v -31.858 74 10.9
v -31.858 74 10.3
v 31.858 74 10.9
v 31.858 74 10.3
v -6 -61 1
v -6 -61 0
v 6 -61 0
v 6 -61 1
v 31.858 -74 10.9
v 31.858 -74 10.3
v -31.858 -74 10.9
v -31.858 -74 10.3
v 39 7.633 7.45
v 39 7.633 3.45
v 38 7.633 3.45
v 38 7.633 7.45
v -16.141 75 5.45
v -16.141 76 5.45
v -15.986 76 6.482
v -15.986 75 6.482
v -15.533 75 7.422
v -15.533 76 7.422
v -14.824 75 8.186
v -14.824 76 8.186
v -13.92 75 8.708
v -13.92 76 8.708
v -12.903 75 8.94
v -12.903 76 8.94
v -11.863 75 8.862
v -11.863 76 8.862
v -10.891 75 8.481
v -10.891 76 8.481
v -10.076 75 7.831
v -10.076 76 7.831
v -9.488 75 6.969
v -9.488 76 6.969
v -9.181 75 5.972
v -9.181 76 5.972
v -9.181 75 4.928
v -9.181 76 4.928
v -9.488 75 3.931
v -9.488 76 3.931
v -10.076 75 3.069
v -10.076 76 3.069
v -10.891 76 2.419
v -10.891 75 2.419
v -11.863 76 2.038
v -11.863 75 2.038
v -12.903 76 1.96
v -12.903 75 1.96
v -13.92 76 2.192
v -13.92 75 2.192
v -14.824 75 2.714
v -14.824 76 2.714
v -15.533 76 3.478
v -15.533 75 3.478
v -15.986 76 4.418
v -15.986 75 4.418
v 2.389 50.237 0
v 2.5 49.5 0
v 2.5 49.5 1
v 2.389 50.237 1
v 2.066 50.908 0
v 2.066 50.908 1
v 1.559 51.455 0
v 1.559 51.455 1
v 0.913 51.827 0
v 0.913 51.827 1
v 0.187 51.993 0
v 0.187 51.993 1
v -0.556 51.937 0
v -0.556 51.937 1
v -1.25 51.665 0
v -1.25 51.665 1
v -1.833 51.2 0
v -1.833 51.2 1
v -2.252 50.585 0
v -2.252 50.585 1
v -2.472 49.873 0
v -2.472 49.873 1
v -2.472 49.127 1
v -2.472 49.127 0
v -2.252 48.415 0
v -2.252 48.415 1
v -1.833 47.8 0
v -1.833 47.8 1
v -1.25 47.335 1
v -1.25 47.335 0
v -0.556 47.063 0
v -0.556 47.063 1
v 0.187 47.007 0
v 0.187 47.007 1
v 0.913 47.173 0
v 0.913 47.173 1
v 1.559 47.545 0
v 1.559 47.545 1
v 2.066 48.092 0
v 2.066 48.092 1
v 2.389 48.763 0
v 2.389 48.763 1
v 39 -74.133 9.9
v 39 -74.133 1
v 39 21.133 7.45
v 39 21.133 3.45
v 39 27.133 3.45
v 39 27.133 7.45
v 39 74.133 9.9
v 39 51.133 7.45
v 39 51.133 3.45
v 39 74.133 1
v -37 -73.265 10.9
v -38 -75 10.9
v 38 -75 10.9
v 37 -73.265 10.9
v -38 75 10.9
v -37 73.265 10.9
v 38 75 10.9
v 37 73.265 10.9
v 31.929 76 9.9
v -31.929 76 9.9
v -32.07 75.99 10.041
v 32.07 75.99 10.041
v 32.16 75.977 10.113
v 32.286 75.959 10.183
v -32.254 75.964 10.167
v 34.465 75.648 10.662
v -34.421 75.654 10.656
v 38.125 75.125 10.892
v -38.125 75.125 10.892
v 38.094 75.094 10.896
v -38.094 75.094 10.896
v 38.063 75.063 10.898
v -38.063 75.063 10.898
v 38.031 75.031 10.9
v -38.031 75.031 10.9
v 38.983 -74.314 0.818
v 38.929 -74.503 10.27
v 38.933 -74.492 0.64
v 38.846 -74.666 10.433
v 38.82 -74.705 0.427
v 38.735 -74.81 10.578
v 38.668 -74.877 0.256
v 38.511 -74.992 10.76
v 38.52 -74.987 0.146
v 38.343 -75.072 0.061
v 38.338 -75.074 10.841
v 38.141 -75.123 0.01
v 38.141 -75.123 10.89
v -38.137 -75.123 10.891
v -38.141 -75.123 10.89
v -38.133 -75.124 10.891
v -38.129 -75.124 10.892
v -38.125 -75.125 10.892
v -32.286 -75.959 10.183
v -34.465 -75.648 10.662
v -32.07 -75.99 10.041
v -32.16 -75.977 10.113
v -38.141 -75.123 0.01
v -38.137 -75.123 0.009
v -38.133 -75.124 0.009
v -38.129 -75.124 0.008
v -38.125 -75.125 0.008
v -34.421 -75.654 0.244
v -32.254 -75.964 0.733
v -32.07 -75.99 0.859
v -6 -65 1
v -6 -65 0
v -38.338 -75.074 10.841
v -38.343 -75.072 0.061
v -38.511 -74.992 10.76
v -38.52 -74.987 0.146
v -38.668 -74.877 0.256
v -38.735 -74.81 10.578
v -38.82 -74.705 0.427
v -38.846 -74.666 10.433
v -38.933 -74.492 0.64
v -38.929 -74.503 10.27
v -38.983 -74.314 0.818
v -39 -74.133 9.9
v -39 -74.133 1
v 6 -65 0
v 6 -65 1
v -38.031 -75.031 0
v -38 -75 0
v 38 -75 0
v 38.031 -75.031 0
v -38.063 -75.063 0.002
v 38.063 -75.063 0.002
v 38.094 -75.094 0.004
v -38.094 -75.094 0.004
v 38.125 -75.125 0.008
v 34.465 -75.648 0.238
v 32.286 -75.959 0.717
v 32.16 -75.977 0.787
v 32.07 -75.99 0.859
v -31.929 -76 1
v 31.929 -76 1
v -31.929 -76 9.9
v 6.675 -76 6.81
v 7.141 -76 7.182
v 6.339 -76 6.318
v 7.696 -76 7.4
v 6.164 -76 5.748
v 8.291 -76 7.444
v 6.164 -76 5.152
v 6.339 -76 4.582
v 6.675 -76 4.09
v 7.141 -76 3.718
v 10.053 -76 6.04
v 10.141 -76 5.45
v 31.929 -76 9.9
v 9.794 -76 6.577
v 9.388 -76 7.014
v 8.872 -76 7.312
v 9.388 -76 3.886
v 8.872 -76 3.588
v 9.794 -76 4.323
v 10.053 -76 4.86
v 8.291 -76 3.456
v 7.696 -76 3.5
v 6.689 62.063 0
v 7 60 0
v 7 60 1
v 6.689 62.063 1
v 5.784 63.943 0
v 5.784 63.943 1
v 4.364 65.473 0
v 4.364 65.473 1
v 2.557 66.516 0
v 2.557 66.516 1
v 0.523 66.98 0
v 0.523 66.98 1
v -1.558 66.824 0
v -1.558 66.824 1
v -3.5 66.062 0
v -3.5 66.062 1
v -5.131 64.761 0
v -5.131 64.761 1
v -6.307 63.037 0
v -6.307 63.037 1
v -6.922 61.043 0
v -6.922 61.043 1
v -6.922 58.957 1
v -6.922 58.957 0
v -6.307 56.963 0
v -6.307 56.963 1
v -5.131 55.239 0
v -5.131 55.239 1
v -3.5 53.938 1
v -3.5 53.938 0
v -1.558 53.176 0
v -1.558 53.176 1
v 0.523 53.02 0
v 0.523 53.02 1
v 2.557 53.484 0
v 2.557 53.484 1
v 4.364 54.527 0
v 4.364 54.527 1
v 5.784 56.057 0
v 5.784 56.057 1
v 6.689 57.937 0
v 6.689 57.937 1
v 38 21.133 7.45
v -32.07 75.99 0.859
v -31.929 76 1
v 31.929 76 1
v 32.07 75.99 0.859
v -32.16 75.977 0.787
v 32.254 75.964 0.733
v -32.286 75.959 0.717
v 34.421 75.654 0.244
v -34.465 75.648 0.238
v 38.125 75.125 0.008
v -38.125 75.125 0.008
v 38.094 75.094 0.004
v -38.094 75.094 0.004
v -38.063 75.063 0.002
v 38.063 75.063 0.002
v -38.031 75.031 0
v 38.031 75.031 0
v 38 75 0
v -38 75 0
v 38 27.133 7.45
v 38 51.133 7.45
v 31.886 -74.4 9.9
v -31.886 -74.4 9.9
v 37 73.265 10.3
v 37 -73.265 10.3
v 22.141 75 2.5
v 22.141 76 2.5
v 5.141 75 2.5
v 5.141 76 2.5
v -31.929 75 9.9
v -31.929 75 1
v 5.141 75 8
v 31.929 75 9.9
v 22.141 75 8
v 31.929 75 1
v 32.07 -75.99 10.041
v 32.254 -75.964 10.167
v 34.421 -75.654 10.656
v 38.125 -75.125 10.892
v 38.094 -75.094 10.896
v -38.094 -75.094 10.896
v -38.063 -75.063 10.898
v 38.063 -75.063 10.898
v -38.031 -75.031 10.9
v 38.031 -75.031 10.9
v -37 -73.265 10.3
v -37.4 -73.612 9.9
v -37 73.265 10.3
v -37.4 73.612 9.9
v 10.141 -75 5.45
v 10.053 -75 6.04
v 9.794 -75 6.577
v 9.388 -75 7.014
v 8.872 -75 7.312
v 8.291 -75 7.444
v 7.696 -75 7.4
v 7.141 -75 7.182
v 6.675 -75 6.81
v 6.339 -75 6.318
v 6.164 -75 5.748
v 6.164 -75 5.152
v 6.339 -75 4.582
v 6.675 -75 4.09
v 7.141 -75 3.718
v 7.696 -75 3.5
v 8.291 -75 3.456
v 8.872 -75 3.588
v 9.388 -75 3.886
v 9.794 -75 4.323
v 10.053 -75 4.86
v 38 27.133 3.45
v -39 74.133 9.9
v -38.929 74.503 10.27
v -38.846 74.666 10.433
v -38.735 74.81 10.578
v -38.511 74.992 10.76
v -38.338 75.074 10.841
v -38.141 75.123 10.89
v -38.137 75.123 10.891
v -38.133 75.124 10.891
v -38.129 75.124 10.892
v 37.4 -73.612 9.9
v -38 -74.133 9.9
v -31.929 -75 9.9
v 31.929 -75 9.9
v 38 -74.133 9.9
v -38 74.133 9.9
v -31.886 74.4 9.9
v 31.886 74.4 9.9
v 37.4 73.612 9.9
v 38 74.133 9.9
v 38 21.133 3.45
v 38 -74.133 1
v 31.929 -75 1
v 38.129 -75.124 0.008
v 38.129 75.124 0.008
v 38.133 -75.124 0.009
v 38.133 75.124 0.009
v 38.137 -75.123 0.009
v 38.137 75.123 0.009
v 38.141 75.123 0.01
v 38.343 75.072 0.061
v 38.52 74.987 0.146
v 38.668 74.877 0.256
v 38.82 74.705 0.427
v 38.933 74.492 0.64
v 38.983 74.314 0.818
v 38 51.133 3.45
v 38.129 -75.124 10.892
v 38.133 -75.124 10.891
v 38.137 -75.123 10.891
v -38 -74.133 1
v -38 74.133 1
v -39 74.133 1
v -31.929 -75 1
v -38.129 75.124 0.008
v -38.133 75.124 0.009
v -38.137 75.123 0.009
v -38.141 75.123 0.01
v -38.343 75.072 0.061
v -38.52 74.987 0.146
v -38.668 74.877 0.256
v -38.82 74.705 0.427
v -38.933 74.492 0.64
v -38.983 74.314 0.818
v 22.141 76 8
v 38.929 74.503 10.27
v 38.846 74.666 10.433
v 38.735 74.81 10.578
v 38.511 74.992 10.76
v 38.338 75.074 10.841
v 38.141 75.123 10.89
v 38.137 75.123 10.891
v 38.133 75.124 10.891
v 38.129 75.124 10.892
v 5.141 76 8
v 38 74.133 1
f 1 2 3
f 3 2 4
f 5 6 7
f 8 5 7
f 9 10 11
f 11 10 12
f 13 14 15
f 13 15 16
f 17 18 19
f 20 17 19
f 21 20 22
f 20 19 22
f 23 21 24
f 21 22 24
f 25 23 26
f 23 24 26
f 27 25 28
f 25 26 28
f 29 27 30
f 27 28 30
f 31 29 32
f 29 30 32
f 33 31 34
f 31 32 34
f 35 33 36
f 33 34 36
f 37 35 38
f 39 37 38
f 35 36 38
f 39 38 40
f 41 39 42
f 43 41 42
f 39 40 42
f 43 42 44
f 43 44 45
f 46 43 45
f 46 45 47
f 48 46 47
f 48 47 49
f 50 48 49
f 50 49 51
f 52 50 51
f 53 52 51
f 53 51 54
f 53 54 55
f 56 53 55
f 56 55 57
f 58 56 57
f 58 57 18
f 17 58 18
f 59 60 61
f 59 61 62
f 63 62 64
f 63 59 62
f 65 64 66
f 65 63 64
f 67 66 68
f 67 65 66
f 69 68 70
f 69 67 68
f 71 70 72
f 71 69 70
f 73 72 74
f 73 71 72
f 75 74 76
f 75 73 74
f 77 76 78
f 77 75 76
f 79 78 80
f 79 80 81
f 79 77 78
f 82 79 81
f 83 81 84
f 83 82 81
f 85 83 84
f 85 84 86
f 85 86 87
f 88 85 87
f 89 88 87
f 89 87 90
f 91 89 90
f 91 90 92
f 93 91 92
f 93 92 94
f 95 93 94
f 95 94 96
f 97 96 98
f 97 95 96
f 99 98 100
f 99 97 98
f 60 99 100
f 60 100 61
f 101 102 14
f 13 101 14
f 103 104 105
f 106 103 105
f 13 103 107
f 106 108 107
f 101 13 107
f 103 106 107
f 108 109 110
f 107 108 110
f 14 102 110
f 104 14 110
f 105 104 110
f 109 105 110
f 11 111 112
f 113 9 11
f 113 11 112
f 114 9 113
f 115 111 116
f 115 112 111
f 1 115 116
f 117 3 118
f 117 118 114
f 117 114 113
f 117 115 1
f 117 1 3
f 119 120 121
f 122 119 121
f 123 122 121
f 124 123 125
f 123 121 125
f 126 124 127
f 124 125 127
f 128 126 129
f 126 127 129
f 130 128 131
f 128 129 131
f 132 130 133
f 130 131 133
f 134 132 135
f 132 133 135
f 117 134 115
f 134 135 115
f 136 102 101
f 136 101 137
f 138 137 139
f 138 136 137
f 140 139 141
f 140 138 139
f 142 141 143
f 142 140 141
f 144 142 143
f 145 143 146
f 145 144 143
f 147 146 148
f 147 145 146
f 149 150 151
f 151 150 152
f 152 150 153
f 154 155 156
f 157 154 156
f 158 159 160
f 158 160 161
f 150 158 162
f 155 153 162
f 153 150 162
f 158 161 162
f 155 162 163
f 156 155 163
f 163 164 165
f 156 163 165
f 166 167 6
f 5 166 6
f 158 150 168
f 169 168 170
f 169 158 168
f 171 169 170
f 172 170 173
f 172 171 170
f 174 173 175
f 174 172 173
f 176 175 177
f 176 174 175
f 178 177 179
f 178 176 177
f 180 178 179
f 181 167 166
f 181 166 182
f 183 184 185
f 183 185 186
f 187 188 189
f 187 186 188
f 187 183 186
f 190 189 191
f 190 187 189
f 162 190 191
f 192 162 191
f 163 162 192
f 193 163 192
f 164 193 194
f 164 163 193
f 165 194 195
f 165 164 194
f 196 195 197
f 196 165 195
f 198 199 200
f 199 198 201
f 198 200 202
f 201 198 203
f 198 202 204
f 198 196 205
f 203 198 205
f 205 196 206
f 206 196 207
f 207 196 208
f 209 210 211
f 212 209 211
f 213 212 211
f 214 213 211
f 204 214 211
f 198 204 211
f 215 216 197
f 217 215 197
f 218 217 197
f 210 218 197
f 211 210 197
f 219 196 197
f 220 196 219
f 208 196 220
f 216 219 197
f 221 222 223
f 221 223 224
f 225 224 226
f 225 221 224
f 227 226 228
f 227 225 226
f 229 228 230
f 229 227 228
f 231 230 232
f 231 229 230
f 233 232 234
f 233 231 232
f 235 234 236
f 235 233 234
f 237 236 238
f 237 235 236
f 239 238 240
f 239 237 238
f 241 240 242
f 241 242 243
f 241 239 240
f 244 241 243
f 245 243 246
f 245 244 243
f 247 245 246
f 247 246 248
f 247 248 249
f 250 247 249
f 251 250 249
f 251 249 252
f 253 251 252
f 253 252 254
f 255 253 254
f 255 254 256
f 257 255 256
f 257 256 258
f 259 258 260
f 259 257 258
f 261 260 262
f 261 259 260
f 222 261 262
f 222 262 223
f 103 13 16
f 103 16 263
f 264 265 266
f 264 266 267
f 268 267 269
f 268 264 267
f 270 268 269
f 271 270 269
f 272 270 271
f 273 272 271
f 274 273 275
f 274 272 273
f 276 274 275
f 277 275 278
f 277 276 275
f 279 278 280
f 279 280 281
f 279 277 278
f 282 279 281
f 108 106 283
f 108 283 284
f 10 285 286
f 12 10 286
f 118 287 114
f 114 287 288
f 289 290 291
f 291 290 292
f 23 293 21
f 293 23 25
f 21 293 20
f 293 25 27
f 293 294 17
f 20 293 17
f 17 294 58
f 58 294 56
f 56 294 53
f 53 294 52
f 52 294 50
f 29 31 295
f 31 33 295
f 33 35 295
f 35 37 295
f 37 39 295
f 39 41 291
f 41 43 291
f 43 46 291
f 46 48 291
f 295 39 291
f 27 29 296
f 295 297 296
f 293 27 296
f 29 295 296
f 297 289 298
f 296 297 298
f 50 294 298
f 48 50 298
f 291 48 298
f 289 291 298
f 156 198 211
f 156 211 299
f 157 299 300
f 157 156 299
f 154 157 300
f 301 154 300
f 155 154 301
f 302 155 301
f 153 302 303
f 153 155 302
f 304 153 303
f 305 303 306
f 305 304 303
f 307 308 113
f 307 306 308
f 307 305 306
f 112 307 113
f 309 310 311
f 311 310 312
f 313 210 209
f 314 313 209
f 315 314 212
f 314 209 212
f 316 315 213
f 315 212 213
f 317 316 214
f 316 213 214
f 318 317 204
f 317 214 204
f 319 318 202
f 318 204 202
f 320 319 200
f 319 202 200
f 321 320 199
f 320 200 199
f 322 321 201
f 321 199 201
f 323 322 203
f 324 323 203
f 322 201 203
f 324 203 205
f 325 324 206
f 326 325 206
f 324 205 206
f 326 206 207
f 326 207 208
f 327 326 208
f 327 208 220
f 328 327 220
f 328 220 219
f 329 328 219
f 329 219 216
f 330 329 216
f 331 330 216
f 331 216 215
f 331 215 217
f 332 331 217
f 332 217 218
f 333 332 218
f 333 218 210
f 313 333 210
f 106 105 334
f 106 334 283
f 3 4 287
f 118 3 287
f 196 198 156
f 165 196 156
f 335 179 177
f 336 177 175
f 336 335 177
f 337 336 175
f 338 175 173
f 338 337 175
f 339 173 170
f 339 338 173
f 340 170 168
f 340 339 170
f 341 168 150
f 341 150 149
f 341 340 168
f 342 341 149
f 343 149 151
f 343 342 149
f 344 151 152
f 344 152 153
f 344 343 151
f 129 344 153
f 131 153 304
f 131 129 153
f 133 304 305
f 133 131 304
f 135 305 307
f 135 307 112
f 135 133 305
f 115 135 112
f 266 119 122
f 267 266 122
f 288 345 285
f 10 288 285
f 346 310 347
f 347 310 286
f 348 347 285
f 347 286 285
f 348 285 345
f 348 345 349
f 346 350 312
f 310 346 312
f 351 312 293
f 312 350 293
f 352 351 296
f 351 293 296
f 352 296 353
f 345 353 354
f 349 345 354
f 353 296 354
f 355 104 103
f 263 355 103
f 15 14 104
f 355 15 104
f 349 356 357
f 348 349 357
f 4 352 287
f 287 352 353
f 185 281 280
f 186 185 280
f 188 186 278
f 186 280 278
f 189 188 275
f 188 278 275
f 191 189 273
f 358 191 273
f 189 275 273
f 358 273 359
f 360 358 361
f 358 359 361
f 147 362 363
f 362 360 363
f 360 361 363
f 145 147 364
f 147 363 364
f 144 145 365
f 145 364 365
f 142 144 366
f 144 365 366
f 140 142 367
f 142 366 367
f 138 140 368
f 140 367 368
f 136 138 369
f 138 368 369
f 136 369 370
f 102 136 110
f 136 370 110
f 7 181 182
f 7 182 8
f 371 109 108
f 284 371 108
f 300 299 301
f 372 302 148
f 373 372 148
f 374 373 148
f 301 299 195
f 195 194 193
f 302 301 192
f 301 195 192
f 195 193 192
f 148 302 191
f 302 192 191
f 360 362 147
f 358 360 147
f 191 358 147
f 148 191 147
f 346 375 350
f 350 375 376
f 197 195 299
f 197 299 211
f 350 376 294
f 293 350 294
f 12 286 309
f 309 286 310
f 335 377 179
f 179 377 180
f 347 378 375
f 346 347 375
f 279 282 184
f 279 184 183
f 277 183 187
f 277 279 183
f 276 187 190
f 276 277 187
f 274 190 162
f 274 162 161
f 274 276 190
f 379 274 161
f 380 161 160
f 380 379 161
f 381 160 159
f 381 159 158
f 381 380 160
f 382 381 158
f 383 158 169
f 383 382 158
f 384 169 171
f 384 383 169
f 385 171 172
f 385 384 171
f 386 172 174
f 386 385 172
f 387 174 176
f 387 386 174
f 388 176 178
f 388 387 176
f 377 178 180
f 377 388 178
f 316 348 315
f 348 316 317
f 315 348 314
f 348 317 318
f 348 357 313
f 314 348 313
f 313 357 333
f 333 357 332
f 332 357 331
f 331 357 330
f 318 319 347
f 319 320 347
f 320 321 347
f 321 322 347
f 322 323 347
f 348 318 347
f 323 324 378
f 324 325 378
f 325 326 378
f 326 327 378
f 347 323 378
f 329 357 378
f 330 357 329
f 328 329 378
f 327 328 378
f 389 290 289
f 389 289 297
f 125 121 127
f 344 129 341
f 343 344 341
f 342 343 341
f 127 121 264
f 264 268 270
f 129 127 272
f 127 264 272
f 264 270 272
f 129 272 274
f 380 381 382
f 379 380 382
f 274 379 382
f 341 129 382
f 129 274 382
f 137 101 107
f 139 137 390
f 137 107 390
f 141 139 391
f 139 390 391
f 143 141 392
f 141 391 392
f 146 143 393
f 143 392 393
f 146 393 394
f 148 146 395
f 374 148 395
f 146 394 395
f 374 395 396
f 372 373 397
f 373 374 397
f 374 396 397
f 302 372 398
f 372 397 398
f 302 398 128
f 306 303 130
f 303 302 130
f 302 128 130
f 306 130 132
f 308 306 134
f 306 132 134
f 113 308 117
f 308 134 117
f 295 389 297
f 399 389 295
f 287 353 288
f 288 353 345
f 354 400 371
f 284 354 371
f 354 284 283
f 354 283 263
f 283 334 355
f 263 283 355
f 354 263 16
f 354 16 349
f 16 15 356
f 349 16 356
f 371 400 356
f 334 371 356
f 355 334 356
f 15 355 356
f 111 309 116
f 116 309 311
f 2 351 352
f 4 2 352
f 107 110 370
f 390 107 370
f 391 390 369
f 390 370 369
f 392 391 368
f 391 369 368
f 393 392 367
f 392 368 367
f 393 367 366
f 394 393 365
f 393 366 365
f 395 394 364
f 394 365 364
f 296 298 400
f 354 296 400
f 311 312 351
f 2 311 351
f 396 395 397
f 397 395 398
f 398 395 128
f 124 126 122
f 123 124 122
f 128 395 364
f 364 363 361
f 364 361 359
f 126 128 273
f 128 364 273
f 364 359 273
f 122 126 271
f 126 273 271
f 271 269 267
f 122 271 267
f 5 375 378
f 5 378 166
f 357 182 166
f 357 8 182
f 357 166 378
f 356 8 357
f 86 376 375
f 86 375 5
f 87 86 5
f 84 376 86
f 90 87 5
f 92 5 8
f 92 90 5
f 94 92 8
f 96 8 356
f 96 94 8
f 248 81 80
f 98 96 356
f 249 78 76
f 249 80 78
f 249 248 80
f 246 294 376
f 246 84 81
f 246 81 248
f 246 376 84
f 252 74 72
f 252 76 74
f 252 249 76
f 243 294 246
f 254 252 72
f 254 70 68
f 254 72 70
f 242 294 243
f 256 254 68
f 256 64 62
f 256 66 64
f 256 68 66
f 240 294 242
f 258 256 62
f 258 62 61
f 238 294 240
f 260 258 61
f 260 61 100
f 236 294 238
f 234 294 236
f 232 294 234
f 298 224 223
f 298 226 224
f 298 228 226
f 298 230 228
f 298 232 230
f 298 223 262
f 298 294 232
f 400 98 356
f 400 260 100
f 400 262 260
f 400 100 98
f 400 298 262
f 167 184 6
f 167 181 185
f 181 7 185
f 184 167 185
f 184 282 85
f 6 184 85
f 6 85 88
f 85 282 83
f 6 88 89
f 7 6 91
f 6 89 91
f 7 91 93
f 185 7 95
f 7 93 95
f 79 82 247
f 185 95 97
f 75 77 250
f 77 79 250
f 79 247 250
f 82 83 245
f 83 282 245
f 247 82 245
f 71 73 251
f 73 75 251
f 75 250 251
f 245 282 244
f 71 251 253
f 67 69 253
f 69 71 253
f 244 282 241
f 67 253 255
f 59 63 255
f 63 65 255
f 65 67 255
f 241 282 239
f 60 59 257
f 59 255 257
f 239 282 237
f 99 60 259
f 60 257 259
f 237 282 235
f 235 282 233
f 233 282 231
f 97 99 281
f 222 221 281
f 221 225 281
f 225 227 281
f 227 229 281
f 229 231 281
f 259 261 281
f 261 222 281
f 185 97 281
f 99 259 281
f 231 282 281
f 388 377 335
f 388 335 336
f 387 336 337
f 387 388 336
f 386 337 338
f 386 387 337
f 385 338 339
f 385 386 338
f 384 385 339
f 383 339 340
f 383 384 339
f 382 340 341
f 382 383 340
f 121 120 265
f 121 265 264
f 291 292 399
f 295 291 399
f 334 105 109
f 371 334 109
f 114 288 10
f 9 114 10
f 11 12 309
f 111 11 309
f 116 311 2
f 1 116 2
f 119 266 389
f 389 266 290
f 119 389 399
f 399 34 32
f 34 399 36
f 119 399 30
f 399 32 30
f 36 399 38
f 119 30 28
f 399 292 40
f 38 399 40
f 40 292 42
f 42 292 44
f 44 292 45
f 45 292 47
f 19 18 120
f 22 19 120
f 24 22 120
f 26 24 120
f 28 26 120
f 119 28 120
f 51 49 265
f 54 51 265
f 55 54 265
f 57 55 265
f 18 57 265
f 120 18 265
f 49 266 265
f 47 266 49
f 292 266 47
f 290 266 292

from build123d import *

# Parameters (mm, degrees)
F0_W        = 12
F0_H        = 4
F0_R        = 2.5
F0_R_2      = 7
F1_DEPTH    = 1
F3_DEPTH    = 8.9
F5_DEPTH    = 1
F6_T1_DEPTH = 155
F6_T3_DEPTH = 79
F6_T5_DEPTH = 11.2553390593
F6_T7_DEPTH = 15.2364770085
F7_SIZE     = 0.4
F8_W        = 13.5
F8_H        = 4
F8_W_2      = 24
F9_DEPTH    = 25
F10_R       = 3.5
F10_W       = 17
F10_H       = 5.5
F11_DEPTH   = 25
F12_R       = 2
F13_DEPTH   = 25


# Not quite as in the source:
# - a fillet or chamfer that OpenCascade refuses, or shapes differently, is made with other operations: its cross-section is extruded or revolved along the edge and cut away or added
# - a feature names something its author has since deleted; it is built from what else it names


with BuildPart() as f1:
    # F0 (on Top) → F1 (new body)
    with BuildSketch(Plane.XY):
        Polygon((32, 76), (-32, 76), (-39, 75), (-39, -75), (-32, -76), (32, -76), (39, -75), (39, 75), align=None)
        with Locations((0, -63)):
            Rectangle(F0_W, F0_H, mode=Mode.SUBTRACT)
        with Locations((0, 49.5)):
            Circle(F0_R, mode=Mode.SUBTRACT)
        with Locations((0, 60)):
            Circle(F0_R_2, mode=Mode.SUBTRACT)
    extrude(amount=F1_DEPTH)

    # F2 (on face) → F3 (join)
    with BuildSketch(Plane.XY.offset(1)):
        Polygon((39, 75), (32, 76), (-32, 76), (-39, 75), (-39, -75), (-32, -76), (32, -76), (39, -75), align=None)
        Polygon((31.9289321881, -75), (-31.9289321881, -75), (-38, -74.1327045983), (-38, 74.1327045983), (-31.9289321881, 75), (31.9289321881, 75), (38, 74.1327045983), (38, -74.1327045983), align=None, mode=Mode.SUBTRACT)
    extrude(amount=F3_DEPTH)

    # F4 (on face) → F5 (join)
    with BuildSketch(Plane.XY.offset(9.9)):
        Polygon((39, -75), (39, 75), (32, 76), (-32, 76), (-39, 75), (-39, -75), (-32, -76), (32, -76), align=None)
        Polygon((38, -74.1327045983), (31.9289321881, -75), (-31.9289321881, -75), (-38, -74.1327045983), (-38, 74.1327045983), (-31.9289321881, 75), (31.9289321881, 75), (38, 74.1327045983), align=None, mode=Mode.SUBTRACT)
        Polygon((-31.9289321881, -75), (31.9289321881, -75), (38, -74.1327045983), (38, 74.1327045983), (31.9289321881, 75), (-31.9289321881, 75), (-38, 74.1327045983), (-38, -74.1327045983), align=None)
        Polygon((-37, 73.2654091966), (-31.8578643763, 74), (31.8578643763, 74), (37, 73.2654091966), (37, -73.2654091966), (31.8578643763, -74), (-31.8578643763, -74), (-37, -73.2654091966), align=None, mode=Mode.SUBTRACT)
    extrude(amount=F5_DEPTH)

    # F6: fillet of radius 1 on 16 edges, made by hand

    # F6_s2 → F6_t1 (cut)
    with BuildSketch(Plane.XZ.offset(-77.5)):
        with BuildLine():
            ThreePointArc((-39, 9.9), (-38.7071067812, 10.6071067812), (-38, 10.9))
            Line((-38, 10.9), (-39, 10.9))
            Line((-39, 10.9), (-39, 9.9))
        make_face()
        with BuildLine():
            ThreePointArc((39, 9.9), (38.7071067812, 10.6071067812), (38, 10.9))
            Line((38, 10.9), (39, 10.9))
            Line((39, 10.9), (39, 9.9))
        make_face()
        with BuildLine():
            ThreePointArc((38, 0), (38.7071067812, 0.2928932188), (39, 1))
            Line((39, 1), (39, 0))
            Line((39, 0), (38, 0))
        make_face()
        with BuildLine():
            ThreePointArc((-38, 0), (-38.7071067812, 0.2928932188), (-39, 1))
            Line((-39, 1), (-39, 0))
            Line((-39, 0), (-38, 0))
        make_face()
    extrude(amount=F6_T1_DEPTH, mode=Mode.SUBTRACT)

    # F6_s4 → F6_t3 (cut)
    with BuildSketch(Plane.YZ.offset(-39.5)):
        with BuildLine():
            ThreePointArc((76, 9.9), (75.7071067812, 10.6071067812), (75, 10.9))
            Line((75, 10.9), (76, 10.9))
            Line((76, 10.9), (76, 9.9))
        make_face()
        with BuildLine():
            ThreePointArc((-76, 9.9), (-75.7071067812, 10.6071067812), (-75, 10.9))
            Line((-75, 10.9), (-76, 10.9))
            Line((-76, 10.9), (-76, 9.9))
        make_face()
        with BuildLine():
            ThreePointArc((-75, 0), (-75.7071067812, 0.2928932188), (-76, 1))
            Line((-76, 1), (-76, 0))
            Line((-76, 0), (-75, 0))
        make_face()
        with BuildLine():
            ThreePointArc((76, 1), (75.7071067812, 0.2928932188), (75, 0))
            Line((75, 0), (76, 0))
            Line((76, 0), (76, 1))
        make_face()
    extrude(amount=F6_T3_DEPTH, mode=Mode.SUBTRACT)

    # F6_s6 → F6_t5 (cut)
    with BuildSketch(Plane.XY.offset(-0.1776695297)):
        with BuildLine():
            ThreePointArc((31.9289321881, 76), (31.9998212082, 75.9974842088), (32.0703535444, 75.9899494937))
            Line((32.0703535444, 75.9899494937), (32, 76))
            Line((32, 76), (31.9289321881, 76))
        make_face()
        with BuildLine():
            ThreePointArc((-31.9289321881, 76), (-31.9998212082, 75.9974842088), (-32.0703535444, 75.9899494937))
            Line((-32.0703535444, 75.9899494937), (-32, 76))
            Line((-32, 76), (-31.9289321881, 76))
        make_face()
        with BuildLine():
            ThreePointArc((32.0703535444, -75.9899494937), (31.9998212082, -75.9974842088), (31.9289321881, -76))
            Line((31.9289321881, -76), (32, -76))
            Line((32, -76), (32.0703535444, -75.9899494937))
        make_face()
        with BuildLine():
            ThreePointArc((-31.9289321881, -76), (-31.9998212082, -75.9974842088), (-32.0703535444, -75.9899494937))
            Line((-32.0703535444, -75.9899494937), (-32, -76))
            Line((-32, -76), (-31.9289321881, -76))
        make_face()
    extrude(amount=F6_T5_DEPTH, mode=Mode.SUBTRACT)

    # F6_s8 → F6_t7 (cut)
    with BuildSketch(Plane.XY.offset(-2.1682385042)):
        with BuildLine():
            ThreePointArc((39, -74.1327045983), (38.755453955, -74.7879063397), (38.1414213562, -75.122654092))
            Line((38.1414213562, -75.122654092), (39, -75))
            Line((39, -75), (39, -74.1327045983))
        make_face()
        with BuildLine():
            ThreePointArc((39, 74.1327045983), (38.755453955, 74.7879063397), (38.1414213562, 75.122654092))
            Line((38.1414213562, 75.122654092), (39, 75))
            Line((39, 75), (39, 74.1327045983))
        make_face()
        with BuildLine():
            ThreePointArc((-38.1414213562, -75.122654092), (-38.755453955, -74.7879063397), (-39, -74.1327045983))
            Line((-39, -74.1327045983), (-39, -75))
            Line((-39, -75), (-38.1414213562, -75.122654092))
        make_face()
        with BuildLine():
            ThreePointArc((-39, 74.1327045983), (-38.755453955, 74.7879063397), (-38.1414213562, 75.122654092))
            Line((-38.1414213562, 75.122654092), (-39, 75))
            Line((-39, 75), (-39, 74.1327045983))
        make_face()
    extrude(amount=F6_T7_DEPTH, mode=Mode.SUBTRACT)

    # F7
    f7_edges = [f1.edges().sort_by_distance(p)[0] for p in [
        (-34.428932, 73.632705, 9.9),
        (-37, 0, 9.9),
        (0, 74, 9.9),
        (34.428932, 73.632705, 9.9),
        (37, 0, 9.9),
        (34.428932, -73.632705, 9.9),
        (0, -74, 9.9),
        (-34.428932, -73.632705, 9.9),
    ]]
    chamfer(f7_edges, length=F7_SIZE)

    # F8 (on face) → F9 (cut)
    with BuildSketch(Plane.YZ.offset(39)):
        with Locations((14.3827045983, 5.45)):
            Rectangle(F8_W, F8_H)
        with Locations((39.1327045983, 5.45)):
            Rectangle(F8_W_2, F8_H)
    extrude(amount=-F9_DEPTH, mode=Mode.SUBTRACT)

    # F10 (on face) → F11 (cut)
    with BuildSketch(Plane(origin=(0, 76, 0), x_dir=(-1, 0, 0), z_dir=(0, 1, 0))):
        with Locations((12.6414213562, 5.45)):
            Circle(F10_R)
        with Locations((-13.6414213562, 5.25)):
            Rectangle(F10_W, F10_H)
    extrude(amount=-F11_DEPTH, mode=Mode.SUBTRACT)

    # F12 (on face) → F13 (cut)
    with BuildSketch(Plane.XZ.offset(76)):
        with Locations((8.1414213562, 5.45)):
            Circle(F12_R)
    extrude(amount=-F13_DEPTH, mode=Mode.SUBTRACT)


solid = f1.part
